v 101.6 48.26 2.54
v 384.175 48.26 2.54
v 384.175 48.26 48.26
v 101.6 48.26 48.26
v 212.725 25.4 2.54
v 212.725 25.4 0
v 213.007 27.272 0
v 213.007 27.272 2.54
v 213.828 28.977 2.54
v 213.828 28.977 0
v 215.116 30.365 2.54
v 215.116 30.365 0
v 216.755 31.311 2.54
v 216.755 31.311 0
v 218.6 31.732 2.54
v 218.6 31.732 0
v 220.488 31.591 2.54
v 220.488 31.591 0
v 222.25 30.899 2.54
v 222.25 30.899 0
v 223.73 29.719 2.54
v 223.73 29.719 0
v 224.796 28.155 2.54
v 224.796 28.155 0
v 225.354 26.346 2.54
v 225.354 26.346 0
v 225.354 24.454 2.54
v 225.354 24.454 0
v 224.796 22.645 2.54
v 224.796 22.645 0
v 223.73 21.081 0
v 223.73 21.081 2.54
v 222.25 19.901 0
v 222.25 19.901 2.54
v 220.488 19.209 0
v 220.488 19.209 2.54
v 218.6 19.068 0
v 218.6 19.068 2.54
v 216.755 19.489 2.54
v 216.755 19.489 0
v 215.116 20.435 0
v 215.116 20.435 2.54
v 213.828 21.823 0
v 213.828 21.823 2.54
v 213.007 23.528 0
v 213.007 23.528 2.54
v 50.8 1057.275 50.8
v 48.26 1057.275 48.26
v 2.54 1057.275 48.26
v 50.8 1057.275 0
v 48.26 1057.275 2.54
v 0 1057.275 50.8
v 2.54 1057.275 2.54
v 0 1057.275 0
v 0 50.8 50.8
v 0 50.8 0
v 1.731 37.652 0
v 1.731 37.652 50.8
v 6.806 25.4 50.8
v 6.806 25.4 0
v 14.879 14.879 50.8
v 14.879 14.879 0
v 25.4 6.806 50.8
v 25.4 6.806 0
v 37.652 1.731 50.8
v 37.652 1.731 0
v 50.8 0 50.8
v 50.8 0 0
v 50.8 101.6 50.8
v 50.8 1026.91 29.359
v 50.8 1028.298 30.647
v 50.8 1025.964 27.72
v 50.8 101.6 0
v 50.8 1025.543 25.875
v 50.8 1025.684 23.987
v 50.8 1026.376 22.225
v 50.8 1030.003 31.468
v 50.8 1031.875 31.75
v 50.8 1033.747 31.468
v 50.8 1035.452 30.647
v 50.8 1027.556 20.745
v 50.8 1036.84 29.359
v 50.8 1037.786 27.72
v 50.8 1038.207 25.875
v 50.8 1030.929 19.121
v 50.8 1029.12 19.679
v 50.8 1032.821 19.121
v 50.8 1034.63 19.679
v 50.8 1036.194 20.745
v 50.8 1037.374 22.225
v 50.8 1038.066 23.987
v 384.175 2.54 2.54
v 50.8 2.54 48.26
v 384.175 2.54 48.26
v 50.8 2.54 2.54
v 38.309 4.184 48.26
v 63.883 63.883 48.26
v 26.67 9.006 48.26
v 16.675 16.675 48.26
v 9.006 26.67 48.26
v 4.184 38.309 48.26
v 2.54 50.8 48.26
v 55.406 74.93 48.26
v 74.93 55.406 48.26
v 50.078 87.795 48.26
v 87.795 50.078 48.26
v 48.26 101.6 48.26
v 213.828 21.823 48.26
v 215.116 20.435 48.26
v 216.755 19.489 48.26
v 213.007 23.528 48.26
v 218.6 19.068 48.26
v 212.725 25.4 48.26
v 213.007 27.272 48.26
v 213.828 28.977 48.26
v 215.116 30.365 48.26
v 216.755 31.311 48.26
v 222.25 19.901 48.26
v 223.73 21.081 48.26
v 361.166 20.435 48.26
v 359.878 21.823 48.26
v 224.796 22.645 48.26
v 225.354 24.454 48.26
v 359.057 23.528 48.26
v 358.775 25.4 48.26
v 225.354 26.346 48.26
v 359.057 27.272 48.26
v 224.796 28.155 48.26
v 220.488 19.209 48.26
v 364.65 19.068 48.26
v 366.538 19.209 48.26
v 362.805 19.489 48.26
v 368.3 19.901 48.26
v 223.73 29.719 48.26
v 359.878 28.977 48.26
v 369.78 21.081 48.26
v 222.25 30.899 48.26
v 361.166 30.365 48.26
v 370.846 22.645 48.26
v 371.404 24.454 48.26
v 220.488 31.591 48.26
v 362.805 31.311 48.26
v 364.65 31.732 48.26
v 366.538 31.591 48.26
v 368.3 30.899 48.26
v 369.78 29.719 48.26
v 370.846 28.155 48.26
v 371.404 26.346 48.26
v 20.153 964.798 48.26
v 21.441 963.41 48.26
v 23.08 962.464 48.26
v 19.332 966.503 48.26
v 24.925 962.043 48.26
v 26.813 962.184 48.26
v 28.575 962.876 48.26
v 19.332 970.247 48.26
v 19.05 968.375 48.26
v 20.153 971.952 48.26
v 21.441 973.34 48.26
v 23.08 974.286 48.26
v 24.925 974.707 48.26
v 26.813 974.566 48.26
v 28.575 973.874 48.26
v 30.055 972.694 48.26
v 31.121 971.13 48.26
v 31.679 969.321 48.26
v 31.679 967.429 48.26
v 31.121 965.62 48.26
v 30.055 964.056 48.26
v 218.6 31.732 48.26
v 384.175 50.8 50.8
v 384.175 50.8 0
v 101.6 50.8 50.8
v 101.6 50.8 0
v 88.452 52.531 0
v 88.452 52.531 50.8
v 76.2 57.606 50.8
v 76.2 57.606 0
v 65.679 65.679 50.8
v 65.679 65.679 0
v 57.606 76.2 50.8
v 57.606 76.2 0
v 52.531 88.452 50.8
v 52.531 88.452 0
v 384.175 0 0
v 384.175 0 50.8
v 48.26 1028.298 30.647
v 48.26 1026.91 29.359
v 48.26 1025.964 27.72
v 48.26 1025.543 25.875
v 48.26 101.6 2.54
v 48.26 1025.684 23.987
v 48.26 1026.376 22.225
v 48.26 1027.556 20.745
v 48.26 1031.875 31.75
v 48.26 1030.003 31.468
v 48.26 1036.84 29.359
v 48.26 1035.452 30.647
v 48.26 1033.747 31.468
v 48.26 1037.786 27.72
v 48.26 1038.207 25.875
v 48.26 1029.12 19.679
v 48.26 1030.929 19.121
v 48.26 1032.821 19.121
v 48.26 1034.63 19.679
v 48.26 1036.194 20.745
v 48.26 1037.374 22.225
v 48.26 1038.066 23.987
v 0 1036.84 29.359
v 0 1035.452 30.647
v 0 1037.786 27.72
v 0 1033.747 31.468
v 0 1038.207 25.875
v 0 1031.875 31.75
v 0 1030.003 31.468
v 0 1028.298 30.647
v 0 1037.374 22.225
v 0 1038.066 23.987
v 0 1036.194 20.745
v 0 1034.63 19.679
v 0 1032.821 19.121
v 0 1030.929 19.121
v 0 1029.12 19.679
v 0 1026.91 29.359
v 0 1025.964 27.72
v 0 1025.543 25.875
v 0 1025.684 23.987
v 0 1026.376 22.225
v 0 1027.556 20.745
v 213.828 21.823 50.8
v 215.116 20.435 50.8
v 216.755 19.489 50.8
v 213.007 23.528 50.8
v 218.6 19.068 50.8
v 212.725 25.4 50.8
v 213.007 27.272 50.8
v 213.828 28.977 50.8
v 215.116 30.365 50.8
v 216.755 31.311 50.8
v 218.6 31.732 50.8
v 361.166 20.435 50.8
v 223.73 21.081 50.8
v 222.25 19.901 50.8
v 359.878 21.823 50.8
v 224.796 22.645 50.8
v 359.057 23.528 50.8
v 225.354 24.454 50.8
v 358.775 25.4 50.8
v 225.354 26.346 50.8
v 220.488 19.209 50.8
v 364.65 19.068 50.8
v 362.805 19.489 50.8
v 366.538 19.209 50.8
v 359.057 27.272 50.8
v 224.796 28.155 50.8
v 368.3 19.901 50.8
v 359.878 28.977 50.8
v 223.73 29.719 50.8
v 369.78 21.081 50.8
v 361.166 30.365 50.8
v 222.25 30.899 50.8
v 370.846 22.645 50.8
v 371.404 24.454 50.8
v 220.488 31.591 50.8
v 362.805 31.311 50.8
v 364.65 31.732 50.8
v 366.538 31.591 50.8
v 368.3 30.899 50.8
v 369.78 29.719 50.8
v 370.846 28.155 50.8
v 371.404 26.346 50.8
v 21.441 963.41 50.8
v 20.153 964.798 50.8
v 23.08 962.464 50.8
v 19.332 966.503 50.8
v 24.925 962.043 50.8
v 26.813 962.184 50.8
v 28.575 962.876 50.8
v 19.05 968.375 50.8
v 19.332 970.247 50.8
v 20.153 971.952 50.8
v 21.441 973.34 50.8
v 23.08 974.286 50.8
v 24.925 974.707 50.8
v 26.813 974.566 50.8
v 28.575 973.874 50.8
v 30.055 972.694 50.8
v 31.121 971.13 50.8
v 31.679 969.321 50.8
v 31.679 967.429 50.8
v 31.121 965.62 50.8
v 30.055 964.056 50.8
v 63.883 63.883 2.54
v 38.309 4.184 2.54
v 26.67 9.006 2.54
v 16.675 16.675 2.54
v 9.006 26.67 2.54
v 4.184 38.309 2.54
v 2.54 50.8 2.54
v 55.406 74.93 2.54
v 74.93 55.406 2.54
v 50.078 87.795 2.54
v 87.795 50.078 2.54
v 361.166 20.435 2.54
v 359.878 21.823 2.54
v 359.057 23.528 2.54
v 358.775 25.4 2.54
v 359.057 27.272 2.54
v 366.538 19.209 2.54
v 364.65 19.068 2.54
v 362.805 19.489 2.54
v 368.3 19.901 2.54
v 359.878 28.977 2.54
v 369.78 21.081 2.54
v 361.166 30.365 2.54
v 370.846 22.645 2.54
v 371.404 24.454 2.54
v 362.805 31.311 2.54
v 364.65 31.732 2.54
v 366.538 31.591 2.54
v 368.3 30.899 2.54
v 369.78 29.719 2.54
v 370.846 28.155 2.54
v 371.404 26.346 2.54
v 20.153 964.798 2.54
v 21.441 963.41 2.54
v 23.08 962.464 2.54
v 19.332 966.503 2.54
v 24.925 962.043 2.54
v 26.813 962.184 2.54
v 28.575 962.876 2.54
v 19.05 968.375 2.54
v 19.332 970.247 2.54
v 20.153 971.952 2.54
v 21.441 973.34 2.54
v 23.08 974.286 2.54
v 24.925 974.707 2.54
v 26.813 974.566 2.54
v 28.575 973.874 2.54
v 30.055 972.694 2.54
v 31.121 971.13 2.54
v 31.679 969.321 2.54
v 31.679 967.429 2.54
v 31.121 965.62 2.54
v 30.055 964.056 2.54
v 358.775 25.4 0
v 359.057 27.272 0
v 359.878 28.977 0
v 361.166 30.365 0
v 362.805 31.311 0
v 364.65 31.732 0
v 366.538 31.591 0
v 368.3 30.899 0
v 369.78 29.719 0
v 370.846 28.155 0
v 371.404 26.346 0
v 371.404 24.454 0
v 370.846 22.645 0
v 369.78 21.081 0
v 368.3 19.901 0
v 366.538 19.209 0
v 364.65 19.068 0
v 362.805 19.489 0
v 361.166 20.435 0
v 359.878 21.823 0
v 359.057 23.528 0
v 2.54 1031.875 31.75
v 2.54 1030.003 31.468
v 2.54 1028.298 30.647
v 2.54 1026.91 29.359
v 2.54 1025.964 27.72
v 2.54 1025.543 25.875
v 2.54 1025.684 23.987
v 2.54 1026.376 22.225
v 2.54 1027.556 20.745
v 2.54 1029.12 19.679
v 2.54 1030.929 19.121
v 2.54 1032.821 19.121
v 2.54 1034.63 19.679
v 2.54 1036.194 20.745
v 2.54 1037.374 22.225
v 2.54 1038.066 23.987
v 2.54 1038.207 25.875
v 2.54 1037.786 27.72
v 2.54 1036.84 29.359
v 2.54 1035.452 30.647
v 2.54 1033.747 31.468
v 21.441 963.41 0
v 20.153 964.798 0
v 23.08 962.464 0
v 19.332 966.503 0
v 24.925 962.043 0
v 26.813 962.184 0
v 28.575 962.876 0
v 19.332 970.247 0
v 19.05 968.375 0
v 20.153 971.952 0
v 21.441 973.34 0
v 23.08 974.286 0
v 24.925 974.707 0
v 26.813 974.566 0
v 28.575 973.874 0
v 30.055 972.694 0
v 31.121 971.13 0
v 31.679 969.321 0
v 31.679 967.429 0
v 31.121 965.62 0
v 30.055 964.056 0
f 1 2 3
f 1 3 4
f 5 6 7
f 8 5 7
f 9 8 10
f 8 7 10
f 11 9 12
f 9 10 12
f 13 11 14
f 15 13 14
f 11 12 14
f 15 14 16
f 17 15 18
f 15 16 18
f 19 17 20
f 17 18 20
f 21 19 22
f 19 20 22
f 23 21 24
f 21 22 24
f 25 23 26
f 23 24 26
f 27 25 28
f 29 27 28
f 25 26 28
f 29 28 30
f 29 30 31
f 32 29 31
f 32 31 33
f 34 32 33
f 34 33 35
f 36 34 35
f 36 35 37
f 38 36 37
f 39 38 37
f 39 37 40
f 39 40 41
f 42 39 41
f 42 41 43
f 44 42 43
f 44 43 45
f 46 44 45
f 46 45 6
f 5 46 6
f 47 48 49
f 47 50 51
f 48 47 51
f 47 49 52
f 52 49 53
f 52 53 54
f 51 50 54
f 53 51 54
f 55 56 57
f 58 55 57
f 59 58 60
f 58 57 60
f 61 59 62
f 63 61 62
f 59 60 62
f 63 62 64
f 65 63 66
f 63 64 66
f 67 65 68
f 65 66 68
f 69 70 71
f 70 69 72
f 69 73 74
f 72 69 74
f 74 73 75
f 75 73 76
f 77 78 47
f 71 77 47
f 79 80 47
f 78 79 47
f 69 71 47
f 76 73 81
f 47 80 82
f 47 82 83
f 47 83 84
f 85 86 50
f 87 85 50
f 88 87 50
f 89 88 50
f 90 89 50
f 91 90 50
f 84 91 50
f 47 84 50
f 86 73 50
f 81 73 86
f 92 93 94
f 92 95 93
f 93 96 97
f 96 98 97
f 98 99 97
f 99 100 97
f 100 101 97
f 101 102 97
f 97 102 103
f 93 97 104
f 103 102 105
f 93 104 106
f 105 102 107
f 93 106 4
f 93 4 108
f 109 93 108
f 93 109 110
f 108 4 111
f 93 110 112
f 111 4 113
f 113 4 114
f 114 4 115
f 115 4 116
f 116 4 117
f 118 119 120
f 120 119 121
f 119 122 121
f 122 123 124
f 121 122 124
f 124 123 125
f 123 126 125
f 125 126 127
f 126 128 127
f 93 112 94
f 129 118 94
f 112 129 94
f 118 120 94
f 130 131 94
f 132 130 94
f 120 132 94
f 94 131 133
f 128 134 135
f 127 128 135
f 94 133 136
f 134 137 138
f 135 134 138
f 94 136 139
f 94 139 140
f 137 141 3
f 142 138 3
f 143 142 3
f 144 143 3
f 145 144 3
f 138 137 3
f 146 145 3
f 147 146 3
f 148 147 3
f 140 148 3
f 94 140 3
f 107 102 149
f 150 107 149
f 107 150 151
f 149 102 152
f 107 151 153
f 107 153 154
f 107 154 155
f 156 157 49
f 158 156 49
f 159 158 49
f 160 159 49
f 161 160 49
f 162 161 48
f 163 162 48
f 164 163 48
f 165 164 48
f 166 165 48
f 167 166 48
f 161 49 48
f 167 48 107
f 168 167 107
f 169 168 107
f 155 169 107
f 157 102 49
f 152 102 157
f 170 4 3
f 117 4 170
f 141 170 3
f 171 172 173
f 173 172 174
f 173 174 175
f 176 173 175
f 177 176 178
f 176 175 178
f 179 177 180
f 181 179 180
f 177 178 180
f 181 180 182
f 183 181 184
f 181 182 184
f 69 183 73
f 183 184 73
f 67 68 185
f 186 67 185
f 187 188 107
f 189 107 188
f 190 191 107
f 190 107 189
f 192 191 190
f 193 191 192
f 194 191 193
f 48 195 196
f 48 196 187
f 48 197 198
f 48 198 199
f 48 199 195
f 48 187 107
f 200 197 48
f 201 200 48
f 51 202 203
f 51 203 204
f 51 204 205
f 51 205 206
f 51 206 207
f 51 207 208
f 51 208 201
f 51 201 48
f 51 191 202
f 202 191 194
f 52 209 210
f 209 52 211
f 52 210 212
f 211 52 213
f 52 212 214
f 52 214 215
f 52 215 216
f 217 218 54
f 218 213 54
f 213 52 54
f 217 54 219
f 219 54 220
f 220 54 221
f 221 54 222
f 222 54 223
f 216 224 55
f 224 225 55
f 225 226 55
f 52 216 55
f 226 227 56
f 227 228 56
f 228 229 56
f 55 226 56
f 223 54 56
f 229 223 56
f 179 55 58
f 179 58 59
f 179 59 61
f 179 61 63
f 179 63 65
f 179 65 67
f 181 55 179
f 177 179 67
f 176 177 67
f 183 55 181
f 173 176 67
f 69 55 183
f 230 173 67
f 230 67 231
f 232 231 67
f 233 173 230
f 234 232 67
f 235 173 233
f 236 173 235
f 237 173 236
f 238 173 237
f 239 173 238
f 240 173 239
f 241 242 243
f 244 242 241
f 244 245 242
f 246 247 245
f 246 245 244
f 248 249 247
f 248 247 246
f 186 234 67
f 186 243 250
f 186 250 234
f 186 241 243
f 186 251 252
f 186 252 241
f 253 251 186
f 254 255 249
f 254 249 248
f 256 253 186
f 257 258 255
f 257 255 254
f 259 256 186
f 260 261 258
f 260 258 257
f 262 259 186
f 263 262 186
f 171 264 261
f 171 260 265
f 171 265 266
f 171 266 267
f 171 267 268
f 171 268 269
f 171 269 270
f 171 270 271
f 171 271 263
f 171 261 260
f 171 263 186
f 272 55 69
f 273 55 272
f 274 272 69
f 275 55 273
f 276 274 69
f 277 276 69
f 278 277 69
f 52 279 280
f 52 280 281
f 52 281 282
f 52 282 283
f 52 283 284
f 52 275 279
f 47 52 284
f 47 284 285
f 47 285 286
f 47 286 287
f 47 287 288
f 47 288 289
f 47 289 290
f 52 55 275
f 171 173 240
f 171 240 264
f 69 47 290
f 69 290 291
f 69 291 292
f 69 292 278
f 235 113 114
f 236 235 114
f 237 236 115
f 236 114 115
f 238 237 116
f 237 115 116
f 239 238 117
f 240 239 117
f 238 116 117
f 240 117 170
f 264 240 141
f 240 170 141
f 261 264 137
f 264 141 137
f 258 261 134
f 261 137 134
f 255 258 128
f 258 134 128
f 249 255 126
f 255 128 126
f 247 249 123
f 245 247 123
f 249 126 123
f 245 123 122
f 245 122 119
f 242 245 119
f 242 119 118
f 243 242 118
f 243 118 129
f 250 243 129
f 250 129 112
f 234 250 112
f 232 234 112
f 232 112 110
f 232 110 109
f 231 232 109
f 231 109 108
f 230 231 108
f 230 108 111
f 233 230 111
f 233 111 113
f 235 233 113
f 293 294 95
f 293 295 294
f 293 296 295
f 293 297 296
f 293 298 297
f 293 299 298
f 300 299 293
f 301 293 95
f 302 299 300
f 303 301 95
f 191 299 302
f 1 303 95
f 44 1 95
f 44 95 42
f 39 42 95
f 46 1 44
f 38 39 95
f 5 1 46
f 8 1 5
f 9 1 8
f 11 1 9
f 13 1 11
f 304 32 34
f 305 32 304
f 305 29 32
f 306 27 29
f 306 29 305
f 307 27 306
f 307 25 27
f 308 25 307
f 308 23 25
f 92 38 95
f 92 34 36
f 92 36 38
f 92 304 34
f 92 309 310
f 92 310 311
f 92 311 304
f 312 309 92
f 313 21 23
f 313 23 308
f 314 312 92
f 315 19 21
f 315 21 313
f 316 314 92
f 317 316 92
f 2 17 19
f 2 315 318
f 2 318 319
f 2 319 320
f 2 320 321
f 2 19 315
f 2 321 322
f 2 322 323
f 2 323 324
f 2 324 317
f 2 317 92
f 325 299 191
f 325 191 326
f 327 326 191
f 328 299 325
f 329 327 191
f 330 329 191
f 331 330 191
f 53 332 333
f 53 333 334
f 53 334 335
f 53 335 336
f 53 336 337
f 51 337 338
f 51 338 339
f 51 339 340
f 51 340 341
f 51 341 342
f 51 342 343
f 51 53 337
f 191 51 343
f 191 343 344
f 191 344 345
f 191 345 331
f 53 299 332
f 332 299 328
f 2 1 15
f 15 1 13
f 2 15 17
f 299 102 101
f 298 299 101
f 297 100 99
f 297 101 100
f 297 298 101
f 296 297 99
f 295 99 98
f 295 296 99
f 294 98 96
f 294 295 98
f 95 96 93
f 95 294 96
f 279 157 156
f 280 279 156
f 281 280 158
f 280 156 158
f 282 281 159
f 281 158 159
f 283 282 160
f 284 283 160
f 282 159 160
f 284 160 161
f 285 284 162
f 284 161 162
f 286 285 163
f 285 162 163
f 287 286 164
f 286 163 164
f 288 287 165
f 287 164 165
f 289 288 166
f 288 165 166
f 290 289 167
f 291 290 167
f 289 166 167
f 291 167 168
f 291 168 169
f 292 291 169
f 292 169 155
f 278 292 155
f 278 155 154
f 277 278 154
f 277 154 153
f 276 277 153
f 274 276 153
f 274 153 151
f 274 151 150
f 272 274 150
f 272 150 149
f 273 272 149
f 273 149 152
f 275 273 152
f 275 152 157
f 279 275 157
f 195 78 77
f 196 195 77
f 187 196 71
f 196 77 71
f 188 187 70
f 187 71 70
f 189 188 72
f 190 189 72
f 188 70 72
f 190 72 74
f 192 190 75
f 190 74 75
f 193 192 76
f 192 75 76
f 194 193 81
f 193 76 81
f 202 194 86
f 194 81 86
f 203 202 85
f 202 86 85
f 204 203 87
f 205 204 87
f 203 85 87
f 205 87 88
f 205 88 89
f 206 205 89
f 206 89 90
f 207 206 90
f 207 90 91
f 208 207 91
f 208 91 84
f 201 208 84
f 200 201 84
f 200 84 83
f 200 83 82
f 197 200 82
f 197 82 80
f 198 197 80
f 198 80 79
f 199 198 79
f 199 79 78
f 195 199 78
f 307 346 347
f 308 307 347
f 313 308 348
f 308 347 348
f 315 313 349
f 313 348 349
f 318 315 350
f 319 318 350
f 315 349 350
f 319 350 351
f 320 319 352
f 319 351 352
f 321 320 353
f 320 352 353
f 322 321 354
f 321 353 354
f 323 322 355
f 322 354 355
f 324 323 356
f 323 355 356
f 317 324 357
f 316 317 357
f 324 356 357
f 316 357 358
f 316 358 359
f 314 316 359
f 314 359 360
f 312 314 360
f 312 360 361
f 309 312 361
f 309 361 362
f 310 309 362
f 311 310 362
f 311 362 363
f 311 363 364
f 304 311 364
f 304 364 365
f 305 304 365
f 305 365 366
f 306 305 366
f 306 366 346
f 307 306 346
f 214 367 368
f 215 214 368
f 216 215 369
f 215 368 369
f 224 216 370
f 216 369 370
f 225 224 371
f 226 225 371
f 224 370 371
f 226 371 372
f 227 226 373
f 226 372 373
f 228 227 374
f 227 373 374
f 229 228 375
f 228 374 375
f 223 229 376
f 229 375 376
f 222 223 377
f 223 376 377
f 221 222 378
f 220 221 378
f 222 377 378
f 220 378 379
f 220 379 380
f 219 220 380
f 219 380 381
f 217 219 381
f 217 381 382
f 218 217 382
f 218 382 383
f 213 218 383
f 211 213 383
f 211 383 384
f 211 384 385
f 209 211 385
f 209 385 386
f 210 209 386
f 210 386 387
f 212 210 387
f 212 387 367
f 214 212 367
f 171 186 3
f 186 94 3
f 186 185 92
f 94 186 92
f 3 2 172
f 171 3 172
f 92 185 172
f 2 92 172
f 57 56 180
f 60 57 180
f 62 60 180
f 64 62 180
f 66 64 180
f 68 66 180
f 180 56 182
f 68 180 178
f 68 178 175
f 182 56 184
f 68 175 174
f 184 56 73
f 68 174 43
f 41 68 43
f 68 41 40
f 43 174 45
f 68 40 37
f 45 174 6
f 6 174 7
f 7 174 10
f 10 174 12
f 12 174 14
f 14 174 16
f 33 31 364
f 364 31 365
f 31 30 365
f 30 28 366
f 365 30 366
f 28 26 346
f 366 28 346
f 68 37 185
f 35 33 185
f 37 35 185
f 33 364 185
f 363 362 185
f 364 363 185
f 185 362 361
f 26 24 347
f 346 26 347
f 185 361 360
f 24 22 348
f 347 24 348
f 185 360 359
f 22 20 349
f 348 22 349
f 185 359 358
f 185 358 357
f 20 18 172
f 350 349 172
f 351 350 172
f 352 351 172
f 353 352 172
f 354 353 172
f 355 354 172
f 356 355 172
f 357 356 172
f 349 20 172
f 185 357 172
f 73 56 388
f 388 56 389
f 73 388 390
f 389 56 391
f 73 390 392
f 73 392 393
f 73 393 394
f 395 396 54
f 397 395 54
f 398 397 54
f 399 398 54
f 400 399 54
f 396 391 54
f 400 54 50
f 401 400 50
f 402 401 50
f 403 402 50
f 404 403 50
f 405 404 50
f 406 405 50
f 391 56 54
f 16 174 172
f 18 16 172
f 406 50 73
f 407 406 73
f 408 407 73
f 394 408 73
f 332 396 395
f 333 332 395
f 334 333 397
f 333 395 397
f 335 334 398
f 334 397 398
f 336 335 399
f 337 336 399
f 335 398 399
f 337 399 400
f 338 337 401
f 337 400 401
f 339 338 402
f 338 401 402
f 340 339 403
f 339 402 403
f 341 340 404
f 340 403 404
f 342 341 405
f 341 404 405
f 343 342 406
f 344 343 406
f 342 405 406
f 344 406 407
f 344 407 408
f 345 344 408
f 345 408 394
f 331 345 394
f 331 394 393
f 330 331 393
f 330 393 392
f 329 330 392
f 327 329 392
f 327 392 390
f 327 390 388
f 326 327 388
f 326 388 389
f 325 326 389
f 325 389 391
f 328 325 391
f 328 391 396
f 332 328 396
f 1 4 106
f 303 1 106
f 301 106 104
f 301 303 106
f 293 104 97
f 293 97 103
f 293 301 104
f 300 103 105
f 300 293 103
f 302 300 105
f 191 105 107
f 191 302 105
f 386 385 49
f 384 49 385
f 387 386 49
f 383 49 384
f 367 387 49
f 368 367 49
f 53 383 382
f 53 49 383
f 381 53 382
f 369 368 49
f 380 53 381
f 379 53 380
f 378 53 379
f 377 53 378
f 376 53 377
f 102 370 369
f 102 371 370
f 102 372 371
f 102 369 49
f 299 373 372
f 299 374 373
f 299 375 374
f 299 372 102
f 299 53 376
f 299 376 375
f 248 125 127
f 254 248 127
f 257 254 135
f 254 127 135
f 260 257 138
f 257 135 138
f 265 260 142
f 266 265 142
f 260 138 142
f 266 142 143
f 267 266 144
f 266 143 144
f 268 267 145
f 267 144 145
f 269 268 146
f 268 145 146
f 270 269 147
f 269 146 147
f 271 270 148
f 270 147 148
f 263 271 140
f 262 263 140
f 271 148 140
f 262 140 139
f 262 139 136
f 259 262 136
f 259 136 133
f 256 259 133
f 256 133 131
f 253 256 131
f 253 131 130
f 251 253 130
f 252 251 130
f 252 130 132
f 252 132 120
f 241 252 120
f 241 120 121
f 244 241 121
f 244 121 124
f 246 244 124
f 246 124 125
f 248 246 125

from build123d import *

# Parameters (mm, degrees)
BOSS_EXTRUDE1_DEPTH       = 50.8
SHELL1_T                  = -2.54
SKETCH2_W                 = 45.72
SKETCH2_H                 = 45.72
CUT_EXTRUDE2_DEPTH        = 50.8
F_97_0_5_DIAMETER_HOLE1_D = 12.7
F_97_0_5_DIAMETER_HOLE2_D = 12.7
F_97_0_5_DIAMETER_HOLE3_D = 12.7


with BuildPart() as part:
    # Sketch1 → Boss-Extrude1 (new body)
    with BuildSketch(Plane.XY):
        with BuildLine():
            Line((0, 1057.275), (0, 50.8))
            ThreePointArc((0, 50.8), (14.878975516, 14.878975516), (50.8, 0))
            Line((50.8, 0), (384.175, 0))
            Line((384.175, 0), (384.175, 50.8))
            Line((384.175, 50.8), (101.6, 50.8))
            ThreePointArc((101.6, 50.8), (65.678975516, 65.678975516), (50.8, 101.6))
            Line((50.8, 101.6), (50.8, 1057.275))
            Line((50.8, 1057.275), (0, 1057.275))
        make_face()
    extrude(amount=BOSS_EXTRUDE1_DEPTH)

    # Shell1
    shell1_openings = [part.faces().sort_by_distance(p)[0] for p in [
        (25.4, 1057.275, 25.4),
    ]]
    offset(amount=SHELL1_T, openings=shell1_openings, kind=Kind.INTERSECTION)

    # Sketch2 → Cut-Extrude2 (cut)
    with BuildSketch(Plane(origin=(384.175, 0, 0), x_dir=(0, 0, -1), z_dir=(1, 0, 0))):
        with Locations((-25.4, 25.4)):
            Rectangle(SKETCH2_W, SKETCH2_H)
    extrude(amount=-CUT_EXTRUDE2_DEPTH, mode=Mode.SUBTRACT)

    # #97 (0.5) Diameter Hole1 (through all)
    with Locations(Plane(origin=(365.125, 25.4, 50.8), x_dir=(1, 0, 0), z_dir=(0, 0, 1))):
        with Locations((0, 0), (-146.05, 0)):
            Hole(F_97_0_5_DIAMETER_HOLE1_D / 2)

    # #97 (0.5) Diameter Hole2 (through all)
    with Locations(Plane(origin=(0, 1031.875, 25.4), x_dir=(0, 0, -1), z_dir=(-1, 0, 0))):
        with Locations((0, 0)):
            Hole(F_97_0_5_DIAMETER_HOLE2_D / 2)

    # #97 (0.5) Diameter Hole3 (through all)
    with Locations(Plane(origin=(25.4, 968.375, 50.8), x_dir=(1, 0, 0), z_dir=(0, 0, 1))):
        with Locations((0, 0)):
            Hole(F_97_0_5_DIAMETER_HOLE3_D / 2)


solid = part.part
